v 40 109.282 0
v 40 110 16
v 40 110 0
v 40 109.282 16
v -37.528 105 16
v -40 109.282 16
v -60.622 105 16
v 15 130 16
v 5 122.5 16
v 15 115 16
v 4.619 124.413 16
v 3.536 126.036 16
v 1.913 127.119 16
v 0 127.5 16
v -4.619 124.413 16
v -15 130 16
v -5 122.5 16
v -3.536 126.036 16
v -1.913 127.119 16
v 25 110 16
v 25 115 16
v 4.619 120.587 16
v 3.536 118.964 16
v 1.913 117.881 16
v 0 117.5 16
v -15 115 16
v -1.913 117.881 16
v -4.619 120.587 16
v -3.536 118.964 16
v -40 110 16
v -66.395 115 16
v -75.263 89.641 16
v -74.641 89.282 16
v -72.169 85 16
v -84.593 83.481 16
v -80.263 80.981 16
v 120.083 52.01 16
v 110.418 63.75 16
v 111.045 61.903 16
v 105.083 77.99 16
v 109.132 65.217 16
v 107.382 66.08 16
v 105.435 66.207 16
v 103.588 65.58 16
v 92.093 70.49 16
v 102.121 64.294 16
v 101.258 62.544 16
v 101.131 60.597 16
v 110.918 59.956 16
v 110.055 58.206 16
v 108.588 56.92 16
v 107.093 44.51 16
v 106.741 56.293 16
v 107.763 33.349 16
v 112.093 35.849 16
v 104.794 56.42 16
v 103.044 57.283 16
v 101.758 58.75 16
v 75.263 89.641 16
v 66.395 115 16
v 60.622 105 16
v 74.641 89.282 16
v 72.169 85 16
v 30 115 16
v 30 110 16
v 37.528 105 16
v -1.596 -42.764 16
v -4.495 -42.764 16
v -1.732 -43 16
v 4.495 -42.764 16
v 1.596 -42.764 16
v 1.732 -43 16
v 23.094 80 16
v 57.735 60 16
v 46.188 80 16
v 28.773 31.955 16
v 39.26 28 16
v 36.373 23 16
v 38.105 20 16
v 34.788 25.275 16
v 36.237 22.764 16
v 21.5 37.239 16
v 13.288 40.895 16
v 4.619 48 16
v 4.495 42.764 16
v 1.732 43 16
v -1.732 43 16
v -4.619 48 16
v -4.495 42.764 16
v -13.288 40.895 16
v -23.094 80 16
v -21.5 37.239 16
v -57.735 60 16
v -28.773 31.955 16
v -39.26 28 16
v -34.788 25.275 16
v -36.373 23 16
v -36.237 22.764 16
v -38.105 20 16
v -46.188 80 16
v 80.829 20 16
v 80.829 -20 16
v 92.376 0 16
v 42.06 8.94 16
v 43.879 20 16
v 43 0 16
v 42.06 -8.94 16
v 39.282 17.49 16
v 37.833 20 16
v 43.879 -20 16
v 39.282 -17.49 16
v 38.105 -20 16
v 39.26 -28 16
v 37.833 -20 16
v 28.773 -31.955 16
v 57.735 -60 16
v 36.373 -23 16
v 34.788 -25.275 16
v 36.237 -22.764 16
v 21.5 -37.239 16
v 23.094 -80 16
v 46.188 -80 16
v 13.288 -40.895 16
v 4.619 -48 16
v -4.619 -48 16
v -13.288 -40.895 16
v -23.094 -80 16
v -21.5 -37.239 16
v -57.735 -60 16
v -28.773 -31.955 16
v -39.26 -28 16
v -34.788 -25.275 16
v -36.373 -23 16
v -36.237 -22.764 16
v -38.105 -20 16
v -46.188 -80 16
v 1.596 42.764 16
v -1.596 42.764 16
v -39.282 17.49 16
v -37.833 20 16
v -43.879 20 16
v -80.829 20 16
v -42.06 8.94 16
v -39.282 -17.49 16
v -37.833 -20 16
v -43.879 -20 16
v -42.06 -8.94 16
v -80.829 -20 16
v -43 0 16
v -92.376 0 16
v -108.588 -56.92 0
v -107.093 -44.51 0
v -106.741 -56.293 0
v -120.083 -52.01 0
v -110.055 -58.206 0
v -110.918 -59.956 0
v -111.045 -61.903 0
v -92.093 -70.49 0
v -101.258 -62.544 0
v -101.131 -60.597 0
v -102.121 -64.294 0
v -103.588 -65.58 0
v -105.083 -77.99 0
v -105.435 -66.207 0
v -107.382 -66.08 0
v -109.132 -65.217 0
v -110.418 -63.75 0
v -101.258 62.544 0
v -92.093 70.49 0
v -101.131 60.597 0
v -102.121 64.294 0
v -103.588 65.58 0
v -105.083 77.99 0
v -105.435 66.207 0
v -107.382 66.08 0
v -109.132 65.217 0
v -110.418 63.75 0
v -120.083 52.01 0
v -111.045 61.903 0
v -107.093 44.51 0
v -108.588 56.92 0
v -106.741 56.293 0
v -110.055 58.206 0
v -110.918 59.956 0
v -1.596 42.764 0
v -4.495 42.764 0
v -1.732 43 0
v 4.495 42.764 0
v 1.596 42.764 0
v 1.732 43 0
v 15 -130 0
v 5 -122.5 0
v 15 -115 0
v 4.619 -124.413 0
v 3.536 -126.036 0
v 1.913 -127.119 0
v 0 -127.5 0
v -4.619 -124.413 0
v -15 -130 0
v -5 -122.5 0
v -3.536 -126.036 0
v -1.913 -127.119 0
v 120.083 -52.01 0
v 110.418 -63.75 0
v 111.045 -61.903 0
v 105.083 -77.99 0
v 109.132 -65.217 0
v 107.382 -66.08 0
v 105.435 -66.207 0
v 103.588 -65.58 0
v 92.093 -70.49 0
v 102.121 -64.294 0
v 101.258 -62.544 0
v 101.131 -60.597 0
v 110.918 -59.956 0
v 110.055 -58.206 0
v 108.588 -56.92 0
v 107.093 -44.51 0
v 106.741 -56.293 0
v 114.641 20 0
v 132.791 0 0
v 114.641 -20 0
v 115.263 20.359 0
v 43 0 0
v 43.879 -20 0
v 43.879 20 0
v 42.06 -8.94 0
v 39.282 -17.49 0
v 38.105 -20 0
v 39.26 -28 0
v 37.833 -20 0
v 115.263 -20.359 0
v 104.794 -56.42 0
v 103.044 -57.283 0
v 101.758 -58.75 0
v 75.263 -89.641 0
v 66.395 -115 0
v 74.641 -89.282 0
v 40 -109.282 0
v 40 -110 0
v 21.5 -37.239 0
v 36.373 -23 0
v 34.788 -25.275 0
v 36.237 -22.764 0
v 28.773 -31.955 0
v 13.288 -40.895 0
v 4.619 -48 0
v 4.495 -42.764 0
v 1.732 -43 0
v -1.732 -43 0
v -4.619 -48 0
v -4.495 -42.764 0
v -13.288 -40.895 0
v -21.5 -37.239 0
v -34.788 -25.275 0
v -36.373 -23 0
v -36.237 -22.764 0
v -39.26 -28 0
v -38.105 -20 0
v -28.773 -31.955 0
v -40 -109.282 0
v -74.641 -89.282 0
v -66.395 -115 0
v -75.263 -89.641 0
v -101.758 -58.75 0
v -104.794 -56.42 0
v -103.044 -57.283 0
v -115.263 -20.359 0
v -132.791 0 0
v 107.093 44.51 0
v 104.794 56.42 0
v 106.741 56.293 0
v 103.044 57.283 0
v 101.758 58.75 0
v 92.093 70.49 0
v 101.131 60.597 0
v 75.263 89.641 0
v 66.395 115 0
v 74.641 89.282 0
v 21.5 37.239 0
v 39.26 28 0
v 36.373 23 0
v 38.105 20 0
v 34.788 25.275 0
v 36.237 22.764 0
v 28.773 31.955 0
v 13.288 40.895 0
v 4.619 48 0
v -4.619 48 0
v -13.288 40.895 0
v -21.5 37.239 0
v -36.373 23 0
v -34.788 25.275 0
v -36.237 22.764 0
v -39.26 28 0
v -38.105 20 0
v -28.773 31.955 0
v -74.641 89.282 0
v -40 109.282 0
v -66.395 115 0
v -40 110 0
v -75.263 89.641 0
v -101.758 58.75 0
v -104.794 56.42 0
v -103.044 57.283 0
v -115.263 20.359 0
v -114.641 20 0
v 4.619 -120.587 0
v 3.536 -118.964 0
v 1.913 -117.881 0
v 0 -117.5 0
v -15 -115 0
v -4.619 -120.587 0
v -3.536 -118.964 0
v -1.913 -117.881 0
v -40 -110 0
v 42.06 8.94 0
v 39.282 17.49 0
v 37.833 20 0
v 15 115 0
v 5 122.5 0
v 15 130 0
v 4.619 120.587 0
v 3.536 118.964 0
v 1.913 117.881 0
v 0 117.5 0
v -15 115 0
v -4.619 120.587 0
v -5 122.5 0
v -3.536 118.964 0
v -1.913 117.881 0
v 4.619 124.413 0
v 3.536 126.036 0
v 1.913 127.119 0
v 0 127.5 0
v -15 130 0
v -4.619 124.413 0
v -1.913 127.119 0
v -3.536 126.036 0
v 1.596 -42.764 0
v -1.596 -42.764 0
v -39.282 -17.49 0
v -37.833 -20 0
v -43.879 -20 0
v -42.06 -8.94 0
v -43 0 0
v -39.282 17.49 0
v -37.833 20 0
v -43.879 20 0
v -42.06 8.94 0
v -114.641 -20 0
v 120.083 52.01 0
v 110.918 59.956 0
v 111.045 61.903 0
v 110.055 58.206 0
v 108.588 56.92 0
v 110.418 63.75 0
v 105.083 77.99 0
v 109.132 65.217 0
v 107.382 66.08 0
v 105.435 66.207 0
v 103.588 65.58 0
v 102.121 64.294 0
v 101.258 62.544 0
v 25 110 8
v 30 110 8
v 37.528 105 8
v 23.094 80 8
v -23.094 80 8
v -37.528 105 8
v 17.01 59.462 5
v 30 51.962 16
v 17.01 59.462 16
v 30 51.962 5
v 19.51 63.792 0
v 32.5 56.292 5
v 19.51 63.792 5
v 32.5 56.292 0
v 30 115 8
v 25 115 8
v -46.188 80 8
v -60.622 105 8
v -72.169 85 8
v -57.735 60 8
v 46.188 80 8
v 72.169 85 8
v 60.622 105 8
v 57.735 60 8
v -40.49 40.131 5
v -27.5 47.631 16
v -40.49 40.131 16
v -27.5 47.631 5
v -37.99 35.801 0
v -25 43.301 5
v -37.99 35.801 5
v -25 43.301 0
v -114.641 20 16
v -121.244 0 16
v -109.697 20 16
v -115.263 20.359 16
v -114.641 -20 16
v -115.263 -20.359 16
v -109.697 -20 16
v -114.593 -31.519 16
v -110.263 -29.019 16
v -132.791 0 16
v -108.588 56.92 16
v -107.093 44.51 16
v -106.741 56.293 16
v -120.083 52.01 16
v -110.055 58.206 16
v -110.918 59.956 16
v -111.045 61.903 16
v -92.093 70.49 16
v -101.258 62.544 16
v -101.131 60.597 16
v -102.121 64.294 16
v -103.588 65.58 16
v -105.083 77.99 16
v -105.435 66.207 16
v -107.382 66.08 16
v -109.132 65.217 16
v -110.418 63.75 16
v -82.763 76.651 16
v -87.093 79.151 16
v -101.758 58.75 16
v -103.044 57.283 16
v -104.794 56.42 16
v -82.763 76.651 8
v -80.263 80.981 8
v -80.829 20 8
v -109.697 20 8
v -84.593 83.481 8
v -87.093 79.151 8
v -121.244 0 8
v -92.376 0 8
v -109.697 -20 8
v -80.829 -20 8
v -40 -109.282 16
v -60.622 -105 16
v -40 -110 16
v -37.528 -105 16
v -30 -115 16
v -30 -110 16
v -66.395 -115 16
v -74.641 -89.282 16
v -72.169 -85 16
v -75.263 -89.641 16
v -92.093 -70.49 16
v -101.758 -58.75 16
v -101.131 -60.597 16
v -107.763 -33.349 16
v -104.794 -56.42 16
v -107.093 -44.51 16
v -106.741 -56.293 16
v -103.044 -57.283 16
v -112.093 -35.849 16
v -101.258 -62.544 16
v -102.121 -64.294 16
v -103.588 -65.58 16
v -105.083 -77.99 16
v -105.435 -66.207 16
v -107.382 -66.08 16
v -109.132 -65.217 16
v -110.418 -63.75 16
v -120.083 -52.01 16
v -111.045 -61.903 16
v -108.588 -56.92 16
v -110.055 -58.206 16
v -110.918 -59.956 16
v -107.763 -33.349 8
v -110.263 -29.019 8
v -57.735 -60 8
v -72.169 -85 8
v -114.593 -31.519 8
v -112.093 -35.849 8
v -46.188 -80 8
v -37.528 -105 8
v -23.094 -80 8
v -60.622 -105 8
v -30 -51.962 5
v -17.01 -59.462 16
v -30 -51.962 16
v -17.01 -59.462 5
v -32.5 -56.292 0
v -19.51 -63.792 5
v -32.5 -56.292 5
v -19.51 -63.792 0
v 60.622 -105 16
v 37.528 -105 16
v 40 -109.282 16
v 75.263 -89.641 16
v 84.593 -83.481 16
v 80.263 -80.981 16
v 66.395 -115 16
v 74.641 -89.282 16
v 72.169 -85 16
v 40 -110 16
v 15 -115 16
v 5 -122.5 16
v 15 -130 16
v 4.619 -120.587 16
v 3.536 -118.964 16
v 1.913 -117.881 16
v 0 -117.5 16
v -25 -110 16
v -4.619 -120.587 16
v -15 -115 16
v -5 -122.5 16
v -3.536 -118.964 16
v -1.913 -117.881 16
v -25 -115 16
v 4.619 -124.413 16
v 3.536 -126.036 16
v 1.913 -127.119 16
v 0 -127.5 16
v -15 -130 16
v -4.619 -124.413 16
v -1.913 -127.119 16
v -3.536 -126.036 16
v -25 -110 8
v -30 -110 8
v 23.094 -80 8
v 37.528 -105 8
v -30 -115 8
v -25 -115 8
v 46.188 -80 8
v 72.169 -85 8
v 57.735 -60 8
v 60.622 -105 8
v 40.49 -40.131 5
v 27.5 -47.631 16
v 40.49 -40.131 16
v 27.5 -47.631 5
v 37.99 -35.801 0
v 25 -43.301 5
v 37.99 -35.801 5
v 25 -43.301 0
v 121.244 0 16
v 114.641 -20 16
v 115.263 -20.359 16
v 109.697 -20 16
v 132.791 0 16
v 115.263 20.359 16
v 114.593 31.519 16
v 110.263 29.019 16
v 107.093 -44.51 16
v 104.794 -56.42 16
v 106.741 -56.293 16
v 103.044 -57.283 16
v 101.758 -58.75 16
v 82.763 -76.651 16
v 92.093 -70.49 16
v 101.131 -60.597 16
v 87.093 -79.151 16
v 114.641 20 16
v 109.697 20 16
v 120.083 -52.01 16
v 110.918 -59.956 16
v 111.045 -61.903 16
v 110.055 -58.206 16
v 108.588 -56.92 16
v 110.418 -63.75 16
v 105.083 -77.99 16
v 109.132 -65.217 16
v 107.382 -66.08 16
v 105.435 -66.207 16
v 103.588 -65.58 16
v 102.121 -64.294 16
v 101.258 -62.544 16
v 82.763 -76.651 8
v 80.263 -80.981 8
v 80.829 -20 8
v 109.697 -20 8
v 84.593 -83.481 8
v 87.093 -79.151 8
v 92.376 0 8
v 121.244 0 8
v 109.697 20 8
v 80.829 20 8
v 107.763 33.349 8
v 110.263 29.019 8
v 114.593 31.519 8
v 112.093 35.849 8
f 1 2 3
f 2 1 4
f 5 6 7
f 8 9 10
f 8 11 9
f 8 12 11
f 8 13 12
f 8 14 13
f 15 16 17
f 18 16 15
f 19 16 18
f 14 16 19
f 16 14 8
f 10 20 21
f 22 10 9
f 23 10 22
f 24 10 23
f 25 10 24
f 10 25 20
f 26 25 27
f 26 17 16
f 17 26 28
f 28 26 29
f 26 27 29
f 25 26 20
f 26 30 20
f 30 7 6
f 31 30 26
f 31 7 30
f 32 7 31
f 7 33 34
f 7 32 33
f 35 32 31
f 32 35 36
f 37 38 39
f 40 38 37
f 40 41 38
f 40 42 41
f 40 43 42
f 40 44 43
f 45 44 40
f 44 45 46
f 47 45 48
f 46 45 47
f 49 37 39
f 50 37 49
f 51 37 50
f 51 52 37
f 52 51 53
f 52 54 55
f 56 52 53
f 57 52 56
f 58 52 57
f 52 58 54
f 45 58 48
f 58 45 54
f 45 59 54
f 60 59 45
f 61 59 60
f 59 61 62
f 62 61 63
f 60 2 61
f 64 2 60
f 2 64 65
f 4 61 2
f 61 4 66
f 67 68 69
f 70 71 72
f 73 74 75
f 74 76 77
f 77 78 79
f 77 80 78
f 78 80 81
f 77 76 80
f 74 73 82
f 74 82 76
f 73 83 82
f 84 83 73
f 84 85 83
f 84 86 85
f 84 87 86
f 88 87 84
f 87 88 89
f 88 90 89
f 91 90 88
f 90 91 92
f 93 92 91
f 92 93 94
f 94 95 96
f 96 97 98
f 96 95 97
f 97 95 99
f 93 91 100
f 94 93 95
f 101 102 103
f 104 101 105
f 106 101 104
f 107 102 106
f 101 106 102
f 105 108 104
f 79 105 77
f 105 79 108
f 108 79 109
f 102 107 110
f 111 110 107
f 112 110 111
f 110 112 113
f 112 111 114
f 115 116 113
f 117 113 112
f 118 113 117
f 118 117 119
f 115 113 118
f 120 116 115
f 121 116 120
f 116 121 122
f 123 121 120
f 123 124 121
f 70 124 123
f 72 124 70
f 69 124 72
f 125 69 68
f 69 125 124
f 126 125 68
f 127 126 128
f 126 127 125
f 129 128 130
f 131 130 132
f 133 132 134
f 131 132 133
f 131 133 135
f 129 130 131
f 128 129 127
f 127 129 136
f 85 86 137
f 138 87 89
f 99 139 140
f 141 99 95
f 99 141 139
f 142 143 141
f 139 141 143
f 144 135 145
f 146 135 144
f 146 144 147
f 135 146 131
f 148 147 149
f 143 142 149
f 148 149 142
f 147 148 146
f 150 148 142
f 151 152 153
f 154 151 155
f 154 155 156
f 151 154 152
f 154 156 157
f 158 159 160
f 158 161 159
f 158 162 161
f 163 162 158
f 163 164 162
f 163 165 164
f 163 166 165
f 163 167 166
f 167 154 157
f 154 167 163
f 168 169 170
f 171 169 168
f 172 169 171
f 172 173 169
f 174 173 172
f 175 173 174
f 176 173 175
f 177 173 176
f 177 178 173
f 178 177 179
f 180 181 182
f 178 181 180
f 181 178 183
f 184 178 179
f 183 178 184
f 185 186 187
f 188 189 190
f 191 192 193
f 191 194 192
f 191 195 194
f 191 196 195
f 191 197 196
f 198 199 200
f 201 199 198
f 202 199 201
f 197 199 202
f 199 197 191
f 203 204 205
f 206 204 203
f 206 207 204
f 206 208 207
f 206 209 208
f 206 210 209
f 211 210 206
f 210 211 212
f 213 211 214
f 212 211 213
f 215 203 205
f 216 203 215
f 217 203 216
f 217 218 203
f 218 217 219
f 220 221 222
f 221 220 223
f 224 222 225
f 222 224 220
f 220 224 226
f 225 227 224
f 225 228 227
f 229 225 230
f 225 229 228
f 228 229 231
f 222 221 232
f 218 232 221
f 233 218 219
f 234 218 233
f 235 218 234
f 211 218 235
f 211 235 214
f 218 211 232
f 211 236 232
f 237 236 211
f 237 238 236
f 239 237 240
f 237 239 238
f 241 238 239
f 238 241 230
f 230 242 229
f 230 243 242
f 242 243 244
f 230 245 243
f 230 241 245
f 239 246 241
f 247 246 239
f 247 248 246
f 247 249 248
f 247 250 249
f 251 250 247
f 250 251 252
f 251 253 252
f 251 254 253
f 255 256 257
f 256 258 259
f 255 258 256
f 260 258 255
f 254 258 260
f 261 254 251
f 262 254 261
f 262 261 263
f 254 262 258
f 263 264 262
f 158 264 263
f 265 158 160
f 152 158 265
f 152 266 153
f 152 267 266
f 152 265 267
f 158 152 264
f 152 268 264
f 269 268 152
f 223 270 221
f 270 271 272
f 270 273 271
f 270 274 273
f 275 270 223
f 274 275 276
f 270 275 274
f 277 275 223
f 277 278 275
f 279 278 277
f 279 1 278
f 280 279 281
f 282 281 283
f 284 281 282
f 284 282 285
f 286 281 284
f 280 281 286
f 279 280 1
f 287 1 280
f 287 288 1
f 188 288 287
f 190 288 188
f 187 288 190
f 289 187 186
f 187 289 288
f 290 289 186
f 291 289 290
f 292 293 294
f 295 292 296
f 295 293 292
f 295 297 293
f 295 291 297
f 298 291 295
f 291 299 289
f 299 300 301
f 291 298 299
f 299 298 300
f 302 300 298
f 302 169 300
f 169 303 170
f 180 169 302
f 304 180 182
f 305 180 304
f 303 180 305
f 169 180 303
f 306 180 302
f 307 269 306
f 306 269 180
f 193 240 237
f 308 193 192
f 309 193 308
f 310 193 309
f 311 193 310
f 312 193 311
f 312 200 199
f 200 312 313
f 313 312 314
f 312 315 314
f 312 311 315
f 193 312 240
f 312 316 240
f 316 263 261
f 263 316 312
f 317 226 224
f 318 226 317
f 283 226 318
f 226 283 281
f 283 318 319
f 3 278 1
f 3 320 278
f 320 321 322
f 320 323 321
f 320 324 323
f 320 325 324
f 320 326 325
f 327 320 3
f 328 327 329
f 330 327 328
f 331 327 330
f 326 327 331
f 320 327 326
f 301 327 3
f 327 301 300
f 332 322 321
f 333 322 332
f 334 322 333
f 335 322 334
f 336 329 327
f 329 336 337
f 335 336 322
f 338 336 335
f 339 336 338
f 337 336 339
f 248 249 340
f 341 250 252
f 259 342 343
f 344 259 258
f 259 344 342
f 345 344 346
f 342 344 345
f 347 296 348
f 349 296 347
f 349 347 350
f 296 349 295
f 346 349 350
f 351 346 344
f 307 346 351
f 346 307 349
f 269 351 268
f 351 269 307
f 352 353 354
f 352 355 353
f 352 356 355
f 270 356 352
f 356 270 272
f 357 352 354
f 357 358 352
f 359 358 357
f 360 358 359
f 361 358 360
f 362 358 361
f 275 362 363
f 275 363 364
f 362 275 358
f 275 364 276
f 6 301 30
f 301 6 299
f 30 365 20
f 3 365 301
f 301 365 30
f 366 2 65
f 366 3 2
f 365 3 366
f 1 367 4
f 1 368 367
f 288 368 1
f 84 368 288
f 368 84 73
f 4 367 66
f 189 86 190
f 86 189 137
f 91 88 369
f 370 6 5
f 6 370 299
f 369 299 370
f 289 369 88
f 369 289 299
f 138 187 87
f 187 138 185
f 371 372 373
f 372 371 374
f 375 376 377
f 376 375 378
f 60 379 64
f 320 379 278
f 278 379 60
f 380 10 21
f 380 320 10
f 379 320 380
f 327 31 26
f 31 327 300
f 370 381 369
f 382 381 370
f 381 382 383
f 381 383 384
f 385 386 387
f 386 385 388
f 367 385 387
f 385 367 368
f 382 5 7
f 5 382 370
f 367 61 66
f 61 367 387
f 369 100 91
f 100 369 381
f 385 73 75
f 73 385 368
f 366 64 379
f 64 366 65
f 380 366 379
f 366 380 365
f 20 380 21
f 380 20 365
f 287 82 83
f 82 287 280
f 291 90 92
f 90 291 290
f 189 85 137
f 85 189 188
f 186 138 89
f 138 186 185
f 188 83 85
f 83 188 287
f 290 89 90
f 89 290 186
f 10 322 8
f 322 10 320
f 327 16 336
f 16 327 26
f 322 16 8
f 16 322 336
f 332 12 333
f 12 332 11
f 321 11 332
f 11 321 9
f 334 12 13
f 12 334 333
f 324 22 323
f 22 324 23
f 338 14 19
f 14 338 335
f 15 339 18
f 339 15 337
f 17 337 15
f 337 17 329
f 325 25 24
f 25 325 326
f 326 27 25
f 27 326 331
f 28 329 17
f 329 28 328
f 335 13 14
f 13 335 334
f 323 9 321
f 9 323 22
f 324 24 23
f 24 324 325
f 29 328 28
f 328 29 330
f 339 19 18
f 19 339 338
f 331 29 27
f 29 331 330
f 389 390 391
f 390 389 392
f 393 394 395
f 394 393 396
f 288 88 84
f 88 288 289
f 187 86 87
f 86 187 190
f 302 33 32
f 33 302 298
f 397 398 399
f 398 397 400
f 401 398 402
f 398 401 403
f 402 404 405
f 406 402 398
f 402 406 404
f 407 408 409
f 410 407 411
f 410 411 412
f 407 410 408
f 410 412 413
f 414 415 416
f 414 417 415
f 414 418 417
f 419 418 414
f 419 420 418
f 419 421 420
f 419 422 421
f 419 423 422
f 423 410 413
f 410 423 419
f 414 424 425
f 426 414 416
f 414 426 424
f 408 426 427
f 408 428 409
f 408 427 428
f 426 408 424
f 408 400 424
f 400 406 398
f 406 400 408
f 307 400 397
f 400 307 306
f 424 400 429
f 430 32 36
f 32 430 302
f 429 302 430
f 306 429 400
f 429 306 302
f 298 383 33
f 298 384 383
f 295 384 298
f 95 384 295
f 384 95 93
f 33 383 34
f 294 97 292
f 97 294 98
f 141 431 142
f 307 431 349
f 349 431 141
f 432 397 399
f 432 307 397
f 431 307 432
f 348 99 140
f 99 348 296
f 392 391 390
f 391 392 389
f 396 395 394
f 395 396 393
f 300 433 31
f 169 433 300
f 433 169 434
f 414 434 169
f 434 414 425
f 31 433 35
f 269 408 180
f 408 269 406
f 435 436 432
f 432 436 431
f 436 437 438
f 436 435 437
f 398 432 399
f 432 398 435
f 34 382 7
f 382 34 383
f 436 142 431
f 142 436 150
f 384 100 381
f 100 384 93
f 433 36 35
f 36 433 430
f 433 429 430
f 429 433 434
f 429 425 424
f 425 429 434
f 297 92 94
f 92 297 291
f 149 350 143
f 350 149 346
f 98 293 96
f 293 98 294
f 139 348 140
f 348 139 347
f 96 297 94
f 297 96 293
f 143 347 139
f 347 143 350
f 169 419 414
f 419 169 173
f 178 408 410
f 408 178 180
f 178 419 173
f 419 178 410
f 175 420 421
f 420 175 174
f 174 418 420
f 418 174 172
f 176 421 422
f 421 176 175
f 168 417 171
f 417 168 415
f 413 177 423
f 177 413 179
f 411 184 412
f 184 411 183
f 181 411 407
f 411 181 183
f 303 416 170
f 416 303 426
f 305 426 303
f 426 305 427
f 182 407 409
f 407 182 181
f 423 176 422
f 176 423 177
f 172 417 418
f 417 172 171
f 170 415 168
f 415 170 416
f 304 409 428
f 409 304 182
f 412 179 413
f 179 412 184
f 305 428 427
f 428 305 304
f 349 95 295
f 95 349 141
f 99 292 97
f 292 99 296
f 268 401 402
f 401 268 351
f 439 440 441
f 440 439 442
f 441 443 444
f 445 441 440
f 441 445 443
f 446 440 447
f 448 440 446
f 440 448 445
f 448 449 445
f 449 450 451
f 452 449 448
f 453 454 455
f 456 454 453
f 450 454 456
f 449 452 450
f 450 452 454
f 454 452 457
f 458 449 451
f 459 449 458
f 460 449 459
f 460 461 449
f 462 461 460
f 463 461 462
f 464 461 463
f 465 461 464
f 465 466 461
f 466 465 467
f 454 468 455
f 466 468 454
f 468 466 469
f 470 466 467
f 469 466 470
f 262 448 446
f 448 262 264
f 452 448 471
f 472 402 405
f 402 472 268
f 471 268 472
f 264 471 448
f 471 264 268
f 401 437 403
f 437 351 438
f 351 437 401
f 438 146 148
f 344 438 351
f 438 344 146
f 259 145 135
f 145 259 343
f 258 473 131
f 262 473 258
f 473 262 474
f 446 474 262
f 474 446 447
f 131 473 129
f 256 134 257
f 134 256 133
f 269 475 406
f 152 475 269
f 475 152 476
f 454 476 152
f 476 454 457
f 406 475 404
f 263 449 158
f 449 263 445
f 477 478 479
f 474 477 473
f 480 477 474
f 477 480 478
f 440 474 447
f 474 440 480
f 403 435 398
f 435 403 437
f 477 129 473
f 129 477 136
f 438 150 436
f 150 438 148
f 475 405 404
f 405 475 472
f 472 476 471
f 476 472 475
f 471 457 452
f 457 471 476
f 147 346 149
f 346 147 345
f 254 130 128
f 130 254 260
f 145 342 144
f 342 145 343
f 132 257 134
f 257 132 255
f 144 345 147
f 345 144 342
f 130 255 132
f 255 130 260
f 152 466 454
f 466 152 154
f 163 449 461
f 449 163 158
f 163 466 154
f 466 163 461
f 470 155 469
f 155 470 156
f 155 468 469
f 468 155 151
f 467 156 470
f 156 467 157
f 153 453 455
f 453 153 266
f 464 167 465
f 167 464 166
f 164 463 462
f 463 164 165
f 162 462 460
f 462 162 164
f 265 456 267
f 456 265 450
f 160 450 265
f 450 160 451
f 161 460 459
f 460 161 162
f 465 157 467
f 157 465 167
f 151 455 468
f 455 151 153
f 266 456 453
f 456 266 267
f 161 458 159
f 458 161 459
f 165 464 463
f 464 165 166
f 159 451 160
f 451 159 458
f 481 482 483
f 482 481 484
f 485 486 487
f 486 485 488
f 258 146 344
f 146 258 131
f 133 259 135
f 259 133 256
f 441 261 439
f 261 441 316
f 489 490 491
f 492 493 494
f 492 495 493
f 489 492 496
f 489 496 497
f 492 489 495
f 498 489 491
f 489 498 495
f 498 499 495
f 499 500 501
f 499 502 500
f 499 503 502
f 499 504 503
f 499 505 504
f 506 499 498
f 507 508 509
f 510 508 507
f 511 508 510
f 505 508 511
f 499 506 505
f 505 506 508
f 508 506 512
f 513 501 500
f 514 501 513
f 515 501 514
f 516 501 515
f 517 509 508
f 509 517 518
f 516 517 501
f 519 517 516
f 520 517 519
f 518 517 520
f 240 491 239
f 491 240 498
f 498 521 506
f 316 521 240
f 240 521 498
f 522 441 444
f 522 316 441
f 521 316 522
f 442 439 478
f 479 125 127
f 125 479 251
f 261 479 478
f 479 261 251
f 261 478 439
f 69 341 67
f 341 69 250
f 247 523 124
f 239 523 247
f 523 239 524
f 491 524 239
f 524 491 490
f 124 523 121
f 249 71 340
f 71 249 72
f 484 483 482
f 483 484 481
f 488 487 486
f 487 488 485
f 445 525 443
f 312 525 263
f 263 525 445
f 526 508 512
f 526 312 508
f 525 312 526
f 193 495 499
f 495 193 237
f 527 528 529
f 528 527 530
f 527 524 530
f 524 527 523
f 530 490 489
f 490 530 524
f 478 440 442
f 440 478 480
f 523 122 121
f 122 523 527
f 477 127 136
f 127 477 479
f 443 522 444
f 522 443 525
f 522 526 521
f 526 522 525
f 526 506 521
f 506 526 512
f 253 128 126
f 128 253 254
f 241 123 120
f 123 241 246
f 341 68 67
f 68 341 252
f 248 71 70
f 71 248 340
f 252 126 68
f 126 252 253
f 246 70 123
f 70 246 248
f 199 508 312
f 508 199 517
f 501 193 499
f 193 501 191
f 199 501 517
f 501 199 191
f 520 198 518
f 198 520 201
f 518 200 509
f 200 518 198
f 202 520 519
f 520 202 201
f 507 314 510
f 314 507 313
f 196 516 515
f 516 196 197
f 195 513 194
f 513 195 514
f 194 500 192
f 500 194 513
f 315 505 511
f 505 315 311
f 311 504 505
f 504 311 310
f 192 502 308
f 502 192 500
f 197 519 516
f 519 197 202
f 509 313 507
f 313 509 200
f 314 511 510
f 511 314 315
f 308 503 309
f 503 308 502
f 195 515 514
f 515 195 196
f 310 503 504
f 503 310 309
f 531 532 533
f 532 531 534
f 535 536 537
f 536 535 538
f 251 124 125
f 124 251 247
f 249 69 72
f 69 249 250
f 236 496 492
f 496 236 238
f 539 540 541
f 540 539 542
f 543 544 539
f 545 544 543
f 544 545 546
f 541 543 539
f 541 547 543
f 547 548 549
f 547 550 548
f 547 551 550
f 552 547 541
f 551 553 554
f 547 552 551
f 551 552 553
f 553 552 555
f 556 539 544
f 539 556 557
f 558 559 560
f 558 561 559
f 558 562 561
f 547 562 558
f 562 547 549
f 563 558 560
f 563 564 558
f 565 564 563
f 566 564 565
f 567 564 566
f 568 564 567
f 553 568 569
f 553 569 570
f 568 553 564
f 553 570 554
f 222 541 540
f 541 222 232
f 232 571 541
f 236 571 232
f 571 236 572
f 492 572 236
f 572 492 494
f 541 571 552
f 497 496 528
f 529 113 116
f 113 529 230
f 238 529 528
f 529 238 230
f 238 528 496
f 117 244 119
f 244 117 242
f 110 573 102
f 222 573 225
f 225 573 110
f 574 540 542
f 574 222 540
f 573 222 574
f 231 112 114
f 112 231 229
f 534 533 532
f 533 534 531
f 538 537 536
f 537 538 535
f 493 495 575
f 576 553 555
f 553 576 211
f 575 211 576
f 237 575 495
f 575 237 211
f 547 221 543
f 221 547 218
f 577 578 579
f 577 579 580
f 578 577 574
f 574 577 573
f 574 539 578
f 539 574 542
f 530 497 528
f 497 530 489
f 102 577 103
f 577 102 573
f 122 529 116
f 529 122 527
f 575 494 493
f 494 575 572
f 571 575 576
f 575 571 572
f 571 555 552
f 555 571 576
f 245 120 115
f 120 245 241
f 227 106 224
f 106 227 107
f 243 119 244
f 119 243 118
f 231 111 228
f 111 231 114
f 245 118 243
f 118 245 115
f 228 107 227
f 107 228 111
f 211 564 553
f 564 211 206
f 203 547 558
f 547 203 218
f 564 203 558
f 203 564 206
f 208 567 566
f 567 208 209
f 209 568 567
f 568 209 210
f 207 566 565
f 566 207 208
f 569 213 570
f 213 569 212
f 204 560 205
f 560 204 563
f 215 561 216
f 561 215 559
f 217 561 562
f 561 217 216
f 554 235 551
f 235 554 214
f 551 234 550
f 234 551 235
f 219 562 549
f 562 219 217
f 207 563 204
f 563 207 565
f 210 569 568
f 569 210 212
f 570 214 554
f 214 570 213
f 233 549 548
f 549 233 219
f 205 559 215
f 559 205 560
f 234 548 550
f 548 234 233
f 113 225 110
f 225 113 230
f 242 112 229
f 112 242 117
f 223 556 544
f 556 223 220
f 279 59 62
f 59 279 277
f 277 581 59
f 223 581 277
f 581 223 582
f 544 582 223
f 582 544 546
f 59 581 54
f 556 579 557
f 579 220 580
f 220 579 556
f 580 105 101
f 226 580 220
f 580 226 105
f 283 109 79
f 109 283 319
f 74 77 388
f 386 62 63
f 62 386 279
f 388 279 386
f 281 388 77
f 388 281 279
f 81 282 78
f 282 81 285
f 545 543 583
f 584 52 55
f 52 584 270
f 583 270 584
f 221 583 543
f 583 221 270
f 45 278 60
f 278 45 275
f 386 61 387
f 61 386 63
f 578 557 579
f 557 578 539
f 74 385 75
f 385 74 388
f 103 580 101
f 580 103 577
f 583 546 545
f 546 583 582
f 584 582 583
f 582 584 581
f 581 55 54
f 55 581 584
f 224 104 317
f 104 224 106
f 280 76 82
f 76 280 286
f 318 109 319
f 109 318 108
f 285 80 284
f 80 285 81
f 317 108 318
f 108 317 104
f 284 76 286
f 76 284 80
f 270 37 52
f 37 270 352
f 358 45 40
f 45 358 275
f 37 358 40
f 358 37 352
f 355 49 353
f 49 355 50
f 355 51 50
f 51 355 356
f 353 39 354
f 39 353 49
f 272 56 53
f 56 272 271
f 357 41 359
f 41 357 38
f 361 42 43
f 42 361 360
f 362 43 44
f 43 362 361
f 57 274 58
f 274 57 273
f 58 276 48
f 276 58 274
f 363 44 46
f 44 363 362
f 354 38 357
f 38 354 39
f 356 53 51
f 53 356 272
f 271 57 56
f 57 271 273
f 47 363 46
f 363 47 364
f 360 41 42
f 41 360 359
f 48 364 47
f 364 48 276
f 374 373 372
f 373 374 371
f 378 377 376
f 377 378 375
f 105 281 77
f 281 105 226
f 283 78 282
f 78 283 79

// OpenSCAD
// file: ../bearing.scad
/*
 * Copyright (c) 2012 Haydn Vestal
 * 
 * See the file license.txt for copying permission.
 * 
 * 
 * DISCLAIMER!
 * THIS IS NOT A PRINTED PART
 * IT IS A PLACEHOLDER FOR A THIRD-PARTY BEARING
 */
include <params.scad>

module bearing() {
  difference() {
    cylinder(h=bearing_height,  r=bearing_or);
    cylinder(h=bearing_height, r=bearing_ir);
  }
}

bearing();
// file: ../stator.scad
/*
 * Copyright (c) 2012 Haydn Vestal
 * 
 * See the file license.txt for copying permission.
 *
 */

include <params.scad>
use <bearing.scad>


stator_x = stator_radius * 1.25;

module coil_subtractor() {
 rotate([0, 0, -30]) {
    cube([coil_edge/2, coil_edge*1.5, stator_height]);
  }
}

module coil() {
  difference() {
    translate([coil_edge/-2, 0, 0]) {
      cube([coil_edge, coil_block_length, stator_height]);
    }
    coil_subtractor();
    mirror([1, 0, 0]) coil_subtractor();
  }
}

module subtractor() {
  rotate([0, 0, -90 + stator_incidence]) {
    cube([stator_radius*0.75, stator_radius*1.5, stator_height]);
  }
}

module tab() {
  difference() {
    cube([stator_outer_tab_width, stator_outer_tab_extrude, stator_height]);
    translate([stator_outer_tab_width/2, stator_outer_tab_extrude/2, 0]) {
      cylinder(h=stator_height, r=hole_radius);
    }
  }
}

module notch() {
  translate([0, (stator_notch/2) - (stator_notch_width/2), 0]) {
    cube([stator_notch, stator_notch_width, stator_height]);
  }
  translate([0, 0, 0]) {
    cube([stator_notch, stator_notch, stator_notch_width]);
  }
}

module stator() {
  difference() {
    translate([stator_x/-2, 0, 0]) {
      cube([stator_x, stator_radius, stator_height]);
    }
    translate([0, coil_edge/2, 0]) coil();
    subtractor();
    mirror([1, 0, 0]) subtractor();
    rotate([0, 0, -90 + stator_incidence]) {
      translate([-stator_notch, stator_tab_offset, 0]) notch();
    }
    translate([stator_x/-2, stator_wiring_gap_inset, stator_height - stator_inner_height]) {
      cube([stator_x, stator_wiring_gap, stator_inner_height]);
    }
    translate([25, stator_radius - stator_notch, stator_height/2]) {
      cube([stator_notch_width, stator_radius/2, stator_height/2]);
    }
    cylinder(h=stator_height, r=bearing_or);
  }
  translate([-5, bearing_or, 0]) cube([10, 5, stator_height]);
  translate([stator_outer_tab_width/-2, stator_radius, 0]) tab();
  rotate([0, 0, 90 - stator_incidence]) {
    translate([-stator_notch, stator_tab_offset, 0]) notch();
  }
}

stator();
// file: ../params.scad
/*
 * Copyright (c) 2012 Haydn Vestal
 * 
 * See the file license.txt for copying permission.
 * 
 */

// GLOBAL
hole_radius = 5;
peg_radius = 4.5;

// MAGNET
mag_height = 6.4;
mag_ring_ir = 50;
mag_ring_or = 102;
mag_count = 16;

// BEARING
bearing_height = 25;
bearing_ir = 31;
bearing_or = 43;

// STATOR
stator_height = 16;
stator_inner_height = stator_height/2;
stator_count = 6;
stator_incidence = 360/stator_count;
stator_radius = 115;
stator_tab_width = 10;
stator_tab_offset = 50;
stator_wiring_gap = 25;
stator_wiring_gap_inset = stator_radius - (stator_wiring_gap + 10);
stator_outer_tab_extrude = 15;
stator_outer_tab_width = 30;
stator_notch = 15;
stator_notch_width = 5;
coil_edge = 80;
coil_block_length = 70;

// ROTOR & ROTOR CAP
rotor_height = mag_height + 2;
rotor_inner_height = 3;
rotor_radius = 105;
rotor_inner_radius = 20;
rotor_count = 8;
rotor_incidence = 360/rotor_count;
rotor_tie_hole_offset = 30;

rotor_cap_radius = 50;
rotor_cap_peg_radius = 35;
rotor_cap_inner_radius = 10;
rotor_cap_height = 10;
rotor_cap_insert_height = 10;
rotor_cap_bearing_inset = (bearing_height + rotor_inner_height) - rotor_cap_height;
rotor_plate_height = 5;
blade_holder_edge = 20;
rotor_peg_width = 12;
rotor_peg_height = (rotor_height * 2) + (rotor_cap_height * 2) + stator_height;

// ROTOR EDGE TIE
rotor_edge_tie_length = 40;
rotor_edge_tie_width = 20;
rotor_edge_tie_inner_height = 5;
rotor_edge_tie_height = rotor_height + rotor_plate_height;
rotor_edge_tie_peg_inset = 10;
// main file
/*
 * Copyright (c) 2012 Haydn Vestal
 * 
 * See the file license.txt for copying permission.
 * 
 */

include <../params.scad>
use <../stator.scad>


module stator_view() {
  for (s = [0:stator_count]) {
    rotate([0, 0, s * (360 / stator_count)]) {
      stator();
    }
  }
}

stator_view();
